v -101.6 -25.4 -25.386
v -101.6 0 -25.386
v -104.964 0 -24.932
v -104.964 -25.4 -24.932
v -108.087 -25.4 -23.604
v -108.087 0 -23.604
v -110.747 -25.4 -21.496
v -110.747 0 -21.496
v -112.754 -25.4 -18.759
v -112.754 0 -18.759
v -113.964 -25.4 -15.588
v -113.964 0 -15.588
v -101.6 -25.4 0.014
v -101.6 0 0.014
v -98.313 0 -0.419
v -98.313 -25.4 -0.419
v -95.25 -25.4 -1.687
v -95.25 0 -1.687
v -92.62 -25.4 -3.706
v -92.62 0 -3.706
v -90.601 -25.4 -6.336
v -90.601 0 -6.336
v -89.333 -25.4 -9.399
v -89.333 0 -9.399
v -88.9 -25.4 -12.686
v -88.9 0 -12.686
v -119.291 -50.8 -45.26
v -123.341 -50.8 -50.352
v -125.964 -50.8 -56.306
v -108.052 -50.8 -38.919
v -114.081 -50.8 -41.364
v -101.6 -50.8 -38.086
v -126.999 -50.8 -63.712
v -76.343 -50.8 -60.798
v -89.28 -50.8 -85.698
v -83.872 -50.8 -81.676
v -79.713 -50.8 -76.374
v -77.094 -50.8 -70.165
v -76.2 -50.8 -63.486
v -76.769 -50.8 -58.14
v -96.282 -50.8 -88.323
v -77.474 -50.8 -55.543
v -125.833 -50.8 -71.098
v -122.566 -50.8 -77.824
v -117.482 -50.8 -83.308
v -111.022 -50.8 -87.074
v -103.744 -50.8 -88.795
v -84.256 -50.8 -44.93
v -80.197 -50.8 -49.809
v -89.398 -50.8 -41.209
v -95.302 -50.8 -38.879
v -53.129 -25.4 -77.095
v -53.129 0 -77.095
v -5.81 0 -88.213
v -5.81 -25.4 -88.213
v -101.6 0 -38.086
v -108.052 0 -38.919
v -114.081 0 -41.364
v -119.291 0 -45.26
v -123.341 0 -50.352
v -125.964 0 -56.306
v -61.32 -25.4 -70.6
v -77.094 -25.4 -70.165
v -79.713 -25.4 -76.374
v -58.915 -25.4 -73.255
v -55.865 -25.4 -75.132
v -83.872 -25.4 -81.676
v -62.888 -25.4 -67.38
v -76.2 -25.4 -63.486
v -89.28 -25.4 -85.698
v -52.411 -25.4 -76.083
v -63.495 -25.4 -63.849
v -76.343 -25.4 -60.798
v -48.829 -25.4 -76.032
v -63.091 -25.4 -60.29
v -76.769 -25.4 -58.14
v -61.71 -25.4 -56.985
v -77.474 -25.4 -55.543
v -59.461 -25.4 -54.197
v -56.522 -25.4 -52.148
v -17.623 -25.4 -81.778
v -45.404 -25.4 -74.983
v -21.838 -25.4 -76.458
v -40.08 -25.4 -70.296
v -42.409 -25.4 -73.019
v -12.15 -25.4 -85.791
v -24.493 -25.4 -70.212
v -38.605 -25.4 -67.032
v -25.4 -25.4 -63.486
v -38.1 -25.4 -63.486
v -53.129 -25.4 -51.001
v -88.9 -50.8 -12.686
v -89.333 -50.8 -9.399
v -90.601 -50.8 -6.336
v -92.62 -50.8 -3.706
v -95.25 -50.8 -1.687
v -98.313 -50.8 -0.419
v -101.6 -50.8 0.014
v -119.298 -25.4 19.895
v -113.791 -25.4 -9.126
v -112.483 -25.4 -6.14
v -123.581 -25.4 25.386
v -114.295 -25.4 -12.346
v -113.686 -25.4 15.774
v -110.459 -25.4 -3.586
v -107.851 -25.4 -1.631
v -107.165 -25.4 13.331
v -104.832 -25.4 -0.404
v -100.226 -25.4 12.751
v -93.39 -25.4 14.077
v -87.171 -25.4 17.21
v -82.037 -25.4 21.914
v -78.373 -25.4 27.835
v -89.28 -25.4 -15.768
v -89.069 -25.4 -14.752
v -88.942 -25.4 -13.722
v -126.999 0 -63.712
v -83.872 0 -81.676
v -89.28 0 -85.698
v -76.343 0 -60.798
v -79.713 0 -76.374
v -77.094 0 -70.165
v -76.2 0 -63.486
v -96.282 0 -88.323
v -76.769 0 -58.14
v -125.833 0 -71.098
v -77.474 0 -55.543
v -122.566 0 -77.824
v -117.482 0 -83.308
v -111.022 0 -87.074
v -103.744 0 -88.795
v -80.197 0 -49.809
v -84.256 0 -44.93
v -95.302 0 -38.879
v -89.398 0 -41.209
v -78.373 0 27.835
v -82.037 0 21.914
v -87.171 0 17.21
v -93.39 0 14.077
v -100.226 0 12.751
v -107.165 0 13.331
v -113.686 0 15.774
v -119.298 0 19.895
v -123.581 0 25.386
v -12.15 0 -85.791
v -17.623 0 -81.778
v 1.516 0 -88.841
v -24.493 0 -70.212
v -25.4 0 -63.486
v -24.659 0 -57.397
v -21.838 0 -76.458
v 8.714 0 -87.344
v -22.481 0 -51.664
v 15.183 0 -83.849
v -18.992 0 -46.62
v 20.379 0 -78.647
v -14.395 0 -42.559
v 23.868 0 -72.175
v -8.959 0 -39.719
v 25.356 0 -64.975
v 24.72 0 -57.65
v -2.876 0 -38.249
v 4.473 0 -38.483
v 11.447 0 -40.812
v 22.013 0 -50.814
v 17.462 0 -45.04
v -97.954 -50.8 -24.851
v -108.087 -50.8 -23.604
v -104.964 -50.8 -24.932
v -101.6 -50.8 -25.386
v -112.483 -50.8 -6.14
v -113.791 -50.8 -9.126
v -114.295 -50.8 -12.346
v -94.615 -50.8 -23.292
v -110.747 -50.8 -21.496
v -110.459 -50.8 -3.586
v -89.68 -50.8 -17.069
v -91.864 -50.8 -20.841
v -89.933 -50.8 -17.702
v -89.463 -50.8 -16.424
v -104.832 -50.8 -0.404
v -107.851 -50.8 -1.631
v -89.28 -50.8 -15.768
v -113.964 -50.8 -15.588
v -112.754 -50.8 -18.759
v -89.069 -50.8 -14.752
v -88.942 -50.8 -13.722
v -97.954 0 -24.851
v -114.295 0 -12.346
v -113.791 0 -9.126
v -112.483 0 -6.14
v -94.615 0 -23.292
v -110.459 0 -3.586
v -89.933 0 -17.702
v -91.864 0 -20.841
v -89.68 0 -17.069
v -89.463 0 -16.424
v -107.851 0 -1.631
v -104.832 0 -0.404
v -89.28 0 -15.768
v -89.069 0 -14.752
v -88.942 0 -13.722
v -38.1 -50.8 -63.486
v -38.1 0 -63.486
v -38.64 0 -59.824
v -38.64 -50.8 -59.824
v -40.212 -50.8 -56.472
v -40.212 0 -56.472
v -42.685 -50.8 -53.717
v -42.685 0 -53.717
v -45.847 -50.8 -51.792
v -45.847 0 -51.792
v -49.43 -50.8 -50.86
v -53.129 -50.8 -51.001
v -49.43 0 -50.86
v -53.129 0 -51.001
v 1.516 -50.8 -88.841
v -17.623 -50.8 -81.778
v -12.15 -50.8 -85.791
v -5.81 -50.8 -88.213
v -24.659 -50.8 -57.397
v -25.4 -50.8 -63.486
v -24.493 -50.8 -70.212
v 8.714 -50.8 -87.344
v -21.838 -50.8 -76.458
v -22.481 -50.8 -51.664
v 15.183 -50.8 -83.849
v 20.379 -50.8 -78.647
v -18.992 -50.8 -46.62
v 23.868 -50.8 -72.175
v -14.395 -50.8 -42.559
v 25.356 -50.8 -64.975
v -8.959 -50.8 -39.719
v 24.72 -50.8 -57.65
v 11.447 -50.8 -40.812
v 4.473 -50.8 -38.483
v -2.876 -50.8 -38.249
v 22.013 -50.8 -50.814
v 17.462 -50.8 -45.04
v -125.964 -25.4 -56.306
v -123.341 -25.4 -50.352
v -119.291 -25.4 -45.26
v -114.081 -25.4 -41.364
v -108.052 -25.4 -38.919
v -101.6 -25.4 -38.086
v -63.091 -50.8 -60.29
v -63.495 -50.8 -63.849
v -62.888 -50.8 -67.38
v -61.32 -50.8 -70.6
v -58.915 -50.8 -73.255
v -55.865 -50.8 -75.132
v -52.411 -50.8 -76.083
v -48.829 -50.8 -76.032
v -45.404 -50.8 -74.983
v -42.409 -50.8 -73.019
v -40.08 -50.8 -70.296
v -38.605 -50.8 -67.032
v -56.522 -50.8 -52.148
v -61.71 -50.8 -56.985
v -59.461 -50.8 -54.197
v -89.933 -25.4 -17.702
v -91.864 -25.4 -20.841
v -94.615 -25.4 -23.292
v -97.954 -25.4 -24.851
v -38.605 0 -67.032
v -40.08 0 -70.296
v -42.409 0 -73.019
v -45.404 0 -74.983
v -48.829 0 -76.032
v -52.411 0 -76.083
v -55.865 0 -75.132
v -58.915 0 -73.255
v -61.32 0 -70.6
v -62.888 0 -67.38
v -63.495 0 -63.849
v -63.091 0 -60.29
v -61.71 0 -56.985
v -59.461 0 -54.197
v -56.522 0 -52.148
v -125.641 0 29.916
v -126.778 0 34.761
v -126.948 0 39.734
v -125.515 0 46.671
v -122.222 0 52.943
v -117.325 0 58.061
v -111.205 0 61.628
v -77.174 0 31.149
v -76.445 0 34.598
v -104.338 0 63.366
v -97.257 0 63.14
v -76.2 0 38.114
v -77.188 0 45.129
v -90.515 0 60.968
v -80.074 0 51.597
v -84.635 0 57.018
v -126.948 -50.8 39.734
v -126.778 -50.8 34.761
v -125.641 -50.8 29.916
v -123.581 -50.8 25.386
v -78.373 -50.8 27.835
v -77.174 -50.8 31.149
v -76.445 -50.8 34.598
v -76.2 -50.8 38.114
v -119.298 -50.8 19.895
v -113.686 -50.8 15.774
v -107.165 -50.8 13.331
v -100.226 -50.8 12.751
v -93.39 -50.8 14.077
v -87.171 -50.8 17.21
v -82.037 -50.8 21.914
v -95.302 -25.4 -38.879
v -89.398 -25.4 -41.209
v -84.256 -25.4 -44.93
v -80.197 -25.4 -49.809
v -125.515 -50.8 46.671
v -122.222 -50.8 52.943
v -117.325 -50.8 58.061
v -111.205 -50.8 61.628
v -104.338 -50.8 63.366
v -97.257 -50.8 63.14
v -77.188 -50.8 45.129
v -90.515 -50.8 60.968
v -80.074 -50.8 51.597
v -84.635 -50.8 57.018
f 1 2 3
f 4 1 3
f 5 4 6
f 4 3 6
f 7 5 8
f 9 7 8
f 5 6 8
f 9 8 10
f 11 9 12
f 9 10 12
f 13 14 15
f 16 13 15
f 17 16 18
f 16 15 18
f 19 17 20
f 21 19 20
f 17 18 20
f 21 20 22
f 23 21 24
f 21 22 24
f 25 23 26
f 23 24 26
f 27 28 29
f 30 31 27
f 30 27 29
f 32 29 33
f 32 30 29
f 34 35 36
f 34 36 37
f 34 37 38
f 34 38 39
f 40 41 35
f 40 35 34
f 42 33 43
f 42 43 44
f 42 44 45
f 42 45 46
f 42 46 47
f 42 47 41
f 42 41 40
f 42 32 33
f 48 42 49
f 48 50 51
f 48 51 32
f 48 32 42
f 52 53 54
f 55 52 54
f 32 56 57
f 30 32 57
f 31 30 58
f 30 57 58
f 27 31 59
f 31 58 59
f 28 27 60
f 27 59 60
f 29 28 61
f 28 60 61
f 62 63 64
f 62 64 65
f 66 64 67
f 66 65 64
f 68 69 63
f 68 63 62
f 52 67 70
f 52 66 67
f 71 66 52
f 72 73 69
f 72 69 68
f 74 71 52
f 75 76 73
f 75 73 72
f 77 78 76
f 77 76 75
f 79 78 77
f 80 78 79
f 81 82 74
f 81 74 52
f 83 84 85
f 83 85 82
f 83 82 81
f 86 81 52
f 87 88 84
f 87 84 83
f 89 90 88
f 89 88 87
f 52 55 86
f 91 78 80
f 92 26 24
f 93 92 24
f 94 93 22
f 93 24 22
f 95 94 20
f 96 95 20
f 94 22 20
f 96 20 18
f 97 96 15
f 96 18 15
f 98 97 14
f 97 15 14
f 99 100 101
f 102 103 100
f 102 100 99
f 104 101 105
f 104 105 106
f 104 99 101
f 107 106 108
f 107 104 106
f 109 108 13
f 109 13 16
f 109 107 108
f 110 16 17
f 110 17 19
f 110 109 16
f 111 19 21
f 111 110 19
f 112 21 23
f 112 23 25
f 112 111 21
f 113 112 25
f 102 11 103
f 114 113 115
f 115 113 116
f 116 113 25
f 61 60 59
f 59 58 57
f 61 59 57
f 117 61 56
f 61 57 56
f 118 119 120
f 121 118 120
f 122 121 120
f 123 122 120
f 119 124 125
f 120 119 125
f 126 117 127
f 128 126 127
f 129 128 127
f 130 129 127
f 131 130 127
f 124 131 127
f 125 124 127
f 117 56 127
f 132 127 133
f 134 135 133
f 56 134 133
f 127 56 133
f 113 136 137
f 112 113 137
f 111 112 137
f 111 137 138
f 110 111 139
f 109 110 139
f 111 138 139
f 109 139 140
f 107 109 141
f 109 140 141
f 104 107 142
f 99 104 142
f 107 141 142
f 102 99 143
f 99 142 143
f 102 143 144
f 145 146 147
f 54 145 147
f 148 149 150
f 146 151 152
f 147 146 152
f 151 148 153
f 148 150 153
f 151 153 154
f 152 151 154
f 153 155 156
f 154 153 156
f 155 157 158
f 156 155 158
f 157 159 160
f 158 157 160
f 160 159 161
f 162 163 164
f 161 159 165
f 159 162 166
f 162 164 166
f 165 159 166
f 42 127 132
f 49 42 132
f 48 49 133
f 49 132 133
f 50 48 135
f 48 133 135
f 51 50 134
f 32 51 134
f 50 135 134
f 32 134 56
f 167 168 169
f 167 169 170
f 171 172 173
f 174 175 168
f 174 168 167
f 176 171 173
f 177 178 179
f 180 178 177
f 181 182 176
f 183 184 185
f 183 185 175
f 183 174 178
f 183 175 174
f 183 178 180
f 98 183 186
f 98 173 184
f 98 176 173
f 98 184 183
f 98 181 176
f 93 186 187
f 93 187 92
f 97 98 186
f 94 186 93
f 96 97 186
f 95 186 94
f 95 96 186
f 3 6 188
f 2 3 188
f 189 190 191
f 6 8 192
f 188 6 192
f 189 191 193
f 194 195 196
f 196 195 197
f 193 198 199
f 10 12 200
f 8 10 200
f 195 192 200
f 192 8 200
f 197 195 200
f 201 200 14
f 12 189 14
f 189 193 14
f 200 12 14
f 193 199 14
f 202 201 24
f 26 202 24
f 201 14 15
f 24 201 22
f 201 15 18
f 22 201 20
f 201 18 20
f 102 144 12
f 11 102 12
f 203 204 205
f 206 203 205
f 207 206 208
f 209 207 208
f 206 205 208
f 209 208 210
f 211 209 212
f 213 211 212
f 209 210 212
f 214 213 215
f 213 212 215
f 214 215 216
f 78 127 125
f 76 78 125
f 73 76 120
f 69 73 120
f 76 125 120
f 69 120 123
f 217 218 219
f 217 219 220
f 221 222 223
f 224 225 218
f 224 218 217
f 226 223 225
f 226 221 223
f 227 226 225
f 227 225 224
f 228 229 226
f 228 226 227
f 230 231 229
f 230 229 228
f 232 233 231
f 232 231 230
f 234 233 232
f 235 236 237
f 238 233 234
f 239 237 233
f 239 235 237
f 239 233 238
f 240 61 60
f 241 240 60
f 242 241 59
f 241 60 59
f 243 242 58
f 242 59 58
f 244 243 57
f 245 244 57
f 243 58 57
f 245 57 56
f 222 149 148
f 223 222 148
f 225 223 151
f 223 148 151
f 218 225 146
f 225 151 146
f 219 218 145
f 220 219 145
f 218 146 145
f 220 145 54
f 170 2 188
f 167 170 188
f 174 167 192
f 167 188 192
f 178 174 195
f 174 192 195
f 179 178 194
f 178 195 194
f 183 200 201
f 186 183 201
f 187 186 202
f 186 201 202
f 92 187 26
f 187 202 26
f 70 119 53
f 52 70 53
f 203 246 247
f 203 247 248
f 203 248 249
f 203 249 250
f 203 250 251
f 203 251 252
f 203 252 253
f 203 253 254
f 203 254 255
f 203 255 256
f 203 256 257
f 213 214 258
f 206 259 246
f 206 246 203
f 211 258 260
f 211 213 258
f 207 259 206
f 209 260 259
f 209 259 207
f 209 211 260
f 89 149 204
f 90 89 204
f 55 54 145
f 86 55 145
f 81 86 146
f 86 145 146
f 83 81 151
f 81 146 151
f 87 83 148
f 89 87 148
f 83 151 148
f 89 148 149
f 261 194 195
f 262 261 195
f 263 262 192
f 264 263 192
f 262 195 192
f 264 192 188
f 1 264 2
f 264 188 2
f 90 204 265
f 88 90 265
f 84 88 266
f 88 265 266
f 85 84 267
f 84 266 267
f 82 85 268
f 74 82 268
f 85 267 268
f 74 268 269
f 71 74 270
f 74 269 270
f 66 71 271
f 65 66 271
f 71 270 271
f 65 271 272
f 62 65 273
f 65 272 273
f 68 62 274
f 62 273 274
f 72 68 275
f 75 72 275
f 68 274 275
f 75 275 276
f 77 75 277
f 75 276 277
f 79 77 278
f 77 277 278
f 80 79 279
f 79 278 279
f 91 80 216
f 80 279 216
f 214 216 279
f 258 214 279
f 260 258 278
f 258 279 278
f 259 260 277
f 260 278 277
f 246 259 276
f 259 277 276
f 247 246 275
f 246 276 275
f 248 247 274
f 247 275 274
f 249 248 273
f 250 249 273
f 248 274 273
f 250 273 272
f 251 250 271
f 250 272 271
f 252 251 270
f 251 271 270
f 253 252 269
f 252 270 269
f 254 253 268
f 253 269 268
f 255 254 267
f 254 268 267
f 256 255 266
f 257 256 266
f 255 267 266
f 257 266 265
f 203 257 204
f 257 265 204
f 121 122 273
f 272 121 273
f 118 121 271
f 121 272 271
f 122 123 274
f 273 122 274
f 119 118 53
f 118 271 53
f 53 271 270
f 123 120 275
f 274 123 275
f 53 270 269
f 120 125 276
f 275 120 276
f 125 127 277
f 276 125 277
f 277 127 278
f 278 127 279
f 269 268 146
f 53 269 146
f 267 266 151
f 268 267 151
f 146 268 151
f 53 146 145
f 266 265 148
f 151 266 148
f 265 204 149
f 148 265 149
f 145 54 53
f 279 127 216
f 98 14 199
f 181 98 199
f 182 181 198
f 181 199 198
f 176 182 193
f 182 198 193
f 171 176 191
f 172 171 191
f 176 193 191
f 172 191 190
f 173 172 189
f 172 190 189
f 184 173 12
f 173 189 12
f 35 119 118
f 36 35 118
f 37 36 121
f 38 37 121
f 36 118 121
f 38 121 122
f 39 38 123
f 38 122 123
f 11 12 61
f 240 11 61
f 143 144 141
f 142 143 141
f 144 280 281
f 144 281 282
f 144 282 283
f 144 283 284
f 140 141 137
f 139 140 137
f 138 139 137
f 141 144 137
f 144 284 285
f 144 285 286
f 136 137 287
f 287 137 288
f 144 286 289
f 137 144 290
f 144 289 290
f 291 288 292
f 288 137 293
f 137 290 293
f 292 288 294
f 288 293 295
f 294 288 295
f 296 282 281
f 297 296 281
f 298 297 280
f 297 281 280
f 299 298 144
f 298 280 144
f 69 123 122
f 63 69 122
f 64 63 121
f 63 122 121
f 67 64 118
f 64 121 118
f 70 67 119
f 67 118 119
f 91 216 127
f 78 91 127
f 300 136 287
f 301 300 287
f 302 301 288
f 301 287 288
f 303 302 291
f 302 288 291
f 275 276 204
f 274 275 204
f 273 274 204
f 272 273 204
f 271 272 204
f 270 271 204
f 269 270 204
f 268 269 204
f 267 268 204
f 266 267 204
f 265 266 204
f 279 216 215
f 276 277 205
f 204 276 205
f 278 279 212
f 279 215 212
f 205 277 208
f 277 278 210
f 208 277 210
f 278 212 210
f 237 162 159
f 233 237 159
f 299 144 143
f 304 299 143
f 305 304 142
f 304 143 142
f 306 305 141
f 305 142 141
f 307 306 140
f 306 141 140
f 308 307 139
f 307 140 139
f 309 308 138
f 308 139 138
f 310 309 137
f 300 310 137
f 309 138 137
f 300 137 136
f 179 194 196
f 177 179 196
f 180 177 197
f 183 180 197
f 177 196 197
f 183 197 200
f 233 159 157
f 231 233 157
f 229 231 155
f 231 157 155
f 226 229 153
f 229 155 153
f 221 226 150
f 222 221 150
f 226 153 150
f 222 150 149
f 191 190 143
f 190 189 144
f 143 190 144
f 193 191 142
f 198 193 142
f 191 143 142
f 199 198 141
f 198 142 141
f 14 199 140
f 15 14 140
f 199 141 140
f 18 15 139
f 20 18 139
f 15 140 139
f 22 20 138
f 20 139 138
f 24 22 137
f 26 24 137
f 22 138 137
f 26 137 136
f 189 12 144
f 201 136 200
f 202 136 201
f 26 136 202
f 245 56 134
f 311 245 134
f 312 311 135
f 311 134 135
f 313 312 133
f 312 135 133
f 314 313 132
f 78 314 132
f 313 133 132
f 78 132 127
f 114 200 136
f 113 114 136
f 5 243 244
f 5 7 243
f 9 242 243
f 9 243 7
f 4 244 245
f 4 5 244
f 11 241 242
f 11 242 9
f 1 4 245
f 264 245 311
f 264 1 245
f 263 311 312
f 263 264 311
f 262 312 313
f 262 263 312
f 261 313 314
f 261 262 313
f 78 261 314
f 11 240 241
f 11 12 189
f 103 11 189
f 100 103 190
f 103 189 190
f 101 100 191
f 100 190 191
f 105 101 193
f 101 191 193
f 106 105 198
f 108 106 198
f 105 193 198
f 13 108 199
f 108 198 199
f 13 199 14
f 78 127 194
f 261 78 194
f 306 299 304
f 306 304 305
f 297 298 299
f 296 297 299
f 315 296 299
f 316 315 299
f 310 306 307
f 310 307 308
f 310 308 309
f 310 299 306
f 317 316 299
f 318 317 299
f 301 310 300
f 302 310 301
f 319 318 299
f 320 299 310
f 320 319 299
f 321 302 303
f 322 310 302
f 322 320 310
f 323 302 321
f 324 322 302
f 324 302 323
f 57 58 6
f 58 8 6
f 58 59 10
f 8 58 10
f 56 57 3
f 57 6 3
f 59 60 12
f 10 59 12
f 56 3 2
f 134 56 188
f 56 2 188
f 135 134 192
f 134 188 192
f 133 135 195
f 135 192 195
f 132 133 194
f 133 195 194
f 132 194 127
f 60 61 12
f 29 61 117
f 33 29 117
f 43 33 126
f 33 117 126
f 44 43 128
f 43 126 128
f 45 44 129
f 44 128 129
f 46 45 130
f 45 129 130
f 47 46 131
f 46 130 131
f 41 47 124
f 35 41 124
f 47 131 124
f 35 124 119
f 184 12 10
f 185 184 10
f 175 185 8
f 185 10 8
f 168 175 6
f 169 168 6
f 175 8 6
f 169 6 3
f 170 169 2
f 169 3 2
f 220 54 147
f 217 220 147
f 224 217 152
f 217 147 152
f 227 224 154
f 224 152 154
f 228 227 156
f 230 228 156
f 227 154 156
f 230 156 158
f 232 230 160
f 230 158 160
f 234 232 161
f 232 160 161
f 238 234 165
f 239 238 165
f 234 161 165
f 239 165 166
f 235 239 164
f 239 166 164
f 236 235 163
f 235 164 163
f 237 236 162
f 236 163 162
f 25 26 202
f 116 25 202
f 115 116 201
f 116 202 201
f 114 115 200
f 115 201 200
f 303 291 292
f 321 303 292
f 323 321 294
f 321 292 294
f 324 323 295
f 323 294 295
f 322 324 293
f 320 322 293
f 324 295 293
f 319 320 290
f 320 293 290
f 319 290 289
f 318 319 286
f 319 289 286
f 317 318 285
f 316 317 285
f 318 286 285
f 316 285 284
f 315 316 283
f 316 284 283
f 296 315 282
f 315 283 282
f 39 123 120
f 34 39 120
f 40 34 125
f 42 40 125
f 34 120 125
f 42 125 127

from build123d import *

# Parameters (mm, degrees)
F1_DEPTH = 50.8
F2_DEPTH = 25.4


with BuildPart() as f1:
    # F0 (on Front) → F1 (new body)
    with BuildSketch(Plane.XZ):
        with BuildLine():
            Line((-126.9482876411, 39.7340031956), (-123.5806948942, 25.3857521911))
            ThreePointArc((-123.5806948942, 25.3857521911), (-114.2858532953, 16.1088230455), (-101.6, 12.7140298423))
            ThreePointArc((-101.6, 12.7140298423), (-87.7423071309, 16.8273121915), (-78.3728507562, 27.8349472954))
            ThreePointArc((-78.3728507562, 27.8349472954), (-76.7491490006, 32.8609160415), (-76.2, 38.1140298423))
            ThreePointArc((-76.2, 38.1140298423), (-100.7896007414, 63.5010984609), (-126.9482876411, 39.7340031956))
        make_face()
        with BuildLine():
            ThreePointArc((-126.9482876411, 39.7340031956), (-126.3280452863, 32.3102572485), (-123.5806948942, 25.3857521911))
            Line((-123.5806948942, 25.3857521911), (-126.9482876411, 39.7340031956))
        make_face()
    extrude(amount=F1_DEPTH)


with BuildPart() as f1b:
    # F0 (on Front) → F1, piece 2 (new body)
    with BuildSketch(Plane.XZ):
        with BuildLine():
            ThreePointArc((-113.9640226431, -15.5878564546), (-109.4878401362, -22.6394609014), (-101.6, -25.3859701577))
            Line((-101.6, -25.3859701577), (-101.6, -12.6859701577))
            Line((-101.6, -12.6859701577), (-101.6, 0.0140298423))
            ThreePointArc((-101.6, 0.0140298423), (-111.5534907437, -4.7981300214), (-113.9640226431, -15.5878564546))
        make_face()
        with BuildLine():
            Line((-101.6, -12.6859701577), (-101.6, -25.3859701577))
            ThreePointArc((-101.6, -25.3859701577), (-94.6148006654, -23.2924299938), (-89.93256123, -17.7020316154))
            ThreePointArc((-89.93256123, -17.7020316154), (-89.5671486402, -16.7480494469), (-89.279593227, -15.7677840629))
            ThreePointArc((-89.279593227, -15.7677840629), (-88.9952555358, -14.2385219253), (-88.9, -12.6859701577))
            ThreePointArc((-88.9, -12.6859701577), (-92.6197438789, -3.7057140366), (-101.6, 0.0140298423))
            Line((-101.6, 0.0140298423), (-101.6, -12.6859701577))
        make_face()
    extrude(amount=F1_DEPTH)


with BuildPart() as f1c:
    # F0 (on Front) → F1, piece 3 (new body)
    with BuildSketch(Plane.XZ):
        with BuildLine():
            Line((-101.6, -38.0859701577), (-101.6, -63.4859701577))
            Line((-101.6, -63.4859701577), (-76.2, -63.4859701577))
            ThreePointArc((-76.2, -63.4859701577), (-76.5205133877, -59.4636137262), (-77.4739646663, -55.5427706087))
            ThreePointArc((-77.4739646663, -55.5427706087), (-86.7103604568, -42.9078595964), (-101.6, -38.0859701577))
        make_face()
        with BuildLine():
            Line((-76.2, -63.4859701577), (-101.6, -63.4859701577))
            Line((-101.6, -63.4859701577), (-101.6, -38.0859701577))
            ThreePointArc((-101.6, -38.0859701577), (-116.811510971, -43.1446345579), (-125.9639724125, -56.3056603954))
            ThreePointArc((-125.9639724125, -56.3056603954), (-117.4819728344, -83.3082540545), (-89.279593227, -85.6978493431))
            ThreePointArc((-89.279593227, -85.6978493431), (-79.7128081742, -76.3743693594), (-76.2, -63.4859701577))
        make_face()
    extrude(amount=F1_DEPTH)


with BuildPart() as f1d:
    # F0 (on Front) → F1, piece 4 (new body)
    with BuildSketch(Plane.XZ):
        with BuildLine():
            Line((-50.8, -63.4859701577), (-63.5, -63.4859701577))
            ThreePointArc((-63.5, -63.4859701577), (-50.8, -76.1859701577), (-38.1, -63.4859701577))
            Line((-38.1, -63.4859701577), (-50.8, -63.4859701577))
        make_face()
        with BuildLine():
            ThreePointArc((-53.1289405052, -51.0013381597), (-60.5690210465, -55.3707851448), (-63.5, -63.4859701577))
            Line((-63.5, -63.4859701577), (-50.8, -63.4859701577))
            Line((-50.8, -63.4859701577), (-38.1, -63.4859701577))
            ThreePointArc((-38.1, -63.4859701577), (-42.6848149872, -53.7169491111), (-53.1289405052, -51.0013381597))
        make_face()
    extrude(amount=F1_DEPTH)


with BuildPart() as f1e:
    # F0 (on Front) → F1, piece 5 (new body)
    with BuildSketch(Plane.XZ):
        with BuildLine():
            ThreePointArc((-8.9594860061, -39.718605758), (-20.8893626585, -49.0362460177), (-25.4, -63.4859701577))
            ThreePointArc((-25.4, -63.4859701577), (-19.9088360045, -79.2593099735), (-5.8095866971, -88.2126501291))
            ThreePointArc((-5.8095866971, -88.2126501291), (15.7733398159, -83.3948061621), (25.4, -63.4859701577))
            ThreePointArc((25.4, -63.4859701577), (16.9133047971, -44.5360329324), (-2.8756000662, -38.249272191))
            Line((-2.8756000662, -38.249272191), (-8.9594860061, -39.718605758))
        make_face()
    extrude(amount=F1_DEPTH)


with BuildPart() as f2:
    # F0 (on Front) → F2 (new body)
    with BuildSketch(Plane.XZ):
        with BuildLine():
            Line((-123.5806948942, 25.3857521911), (-113.9640226431, -15.5878564546))
            ThreePointArc((-113.9640226431, -15.5878564546), (-111.5534907437, -4.7981300214), (-101.6, 0.0140298423))
            Line((-101.6, 0.0140298423), (-101.6, 12.7140298423))
            ThreePointArc((-101.6, 12.7140298423), (-114.2858532953, 16.1088230455), (-123.5806948942, 25.3857521911))
        make_face()
        with BuildLine():
            ThreePointArc((-88.9, -12.6859701577), (-88.9952555358, -14.2385219253), (-89.279593227, -15.7677840629))
            Line((-89.279593227, -15.7677840629), (-78.3728507562, 27.8349472954))
            ThreePointArc((-78.3728507562, 27.8349472954), (-87.7423071309, 16.8273121915), (-101.6, 12.7140298423))
            Line((-101.6, 12.7140298423), (-101.6, 0.0140298423))
            ThreePointArc((-101.6, 0.0140298423), (-92.6197438789, -3.7057140366), (-88.9, -12.6859701577))
        make_face()
    extrude(amount=F2_DEPTH)


with BuildPart() as f2b:
    # F0 (on Front) → F2, piece 2 (new body)
    with BuildSketch(Plane.XZ):
        with BuildLine():
            Line((-101.6, -25.3859701577), (-101.6, -38.0859701577))
            ThreePointArc((-101.6, -38.0859701577), (-86.7103604568, -42.9078595964), (-77.4739646663, -55.5427706087))
            Line((-77.4739646663, -55.5427706087), (-89.93256123, -17.7020316154))
            ThreePointArc((-89.93256123, -17.7020316154), (-94.6148006654, -23.2924299938), (-101.6, -25.3859701577))
        make_face()
        with BuildLine():
            ThreePointArc((-125.9639724125, -56.3056603954), (-116.811510971, -43.1446345579), (-101.6, -38.0859701577))
            Line((-101.6, -38.0859701577), (-101.6, -25.3859701577))
            ThreePointArc((-101.6, -25.3859701577), (-109.4878401362, -22.6394609014), (-113.9640226431, -15.5878564546))
            Line((-113.9640226431, -15.5878564546), (-125.9639724125, -56.3056603954))
        make_face()
    extrude(amount=F2_DEPTH)


with BuildPart() as f2c:
    # F0 (on Front) → F2, piece 3 (new body)
    with BuildSketch(Plane.XZ):
        with BuildLine():
            ThreePointArc((-77.4739646663, -55.5427706087), (-76.5205133877, -59.4636137262), (-76.2, -63.4859701577))
            Line((-76.2, -63.4859701577), (-63.5, -63.4859701577))
            ThreePointArc((-63.5, -63.4859701577), (-60.5690210465, -55.3707851448), (-53.1289405052, -51.0013381597))
            Line((-53.1289405052, -51.0013381597), (-77.4739646663, -55.5427706087))
        make_face()
        with BuildLine():
            Line((-63.5, -63.4859701577), (-76.2, -63.4859701577))
            ThreePointArc((-76.2, -63.4859701577), (-79.7128081742, -76.3743693594), (-89.279593227, -85.6978493431))
            Line((-89.279593227, -85.6978493431), (-53.1289405052, -77.0948660708))
            Line((-53.1289405052, -77.0948660708), (-5.8095866971, -88.2126501291))
            ThreePointArc((-5.8095866971, -88.2126501291), (-19.9088360045, -79.2593099735), (-25.4, -63.4859701577))
            Line((-25.4, -63.4859701577), (-38.1, -63.4859701577))
            ThreePointArc((-38.1, -63.4859701577), (-50.8, -76.1859701577), (-63.5, -63.4859701577))
        make_face()
    extrude(amount=F2_DEPTH)


solid = Compound([f1.part, f1b.part, f1c.part, f1d.part, f1e.part, f2.part, f2b.part, f2c.part])
